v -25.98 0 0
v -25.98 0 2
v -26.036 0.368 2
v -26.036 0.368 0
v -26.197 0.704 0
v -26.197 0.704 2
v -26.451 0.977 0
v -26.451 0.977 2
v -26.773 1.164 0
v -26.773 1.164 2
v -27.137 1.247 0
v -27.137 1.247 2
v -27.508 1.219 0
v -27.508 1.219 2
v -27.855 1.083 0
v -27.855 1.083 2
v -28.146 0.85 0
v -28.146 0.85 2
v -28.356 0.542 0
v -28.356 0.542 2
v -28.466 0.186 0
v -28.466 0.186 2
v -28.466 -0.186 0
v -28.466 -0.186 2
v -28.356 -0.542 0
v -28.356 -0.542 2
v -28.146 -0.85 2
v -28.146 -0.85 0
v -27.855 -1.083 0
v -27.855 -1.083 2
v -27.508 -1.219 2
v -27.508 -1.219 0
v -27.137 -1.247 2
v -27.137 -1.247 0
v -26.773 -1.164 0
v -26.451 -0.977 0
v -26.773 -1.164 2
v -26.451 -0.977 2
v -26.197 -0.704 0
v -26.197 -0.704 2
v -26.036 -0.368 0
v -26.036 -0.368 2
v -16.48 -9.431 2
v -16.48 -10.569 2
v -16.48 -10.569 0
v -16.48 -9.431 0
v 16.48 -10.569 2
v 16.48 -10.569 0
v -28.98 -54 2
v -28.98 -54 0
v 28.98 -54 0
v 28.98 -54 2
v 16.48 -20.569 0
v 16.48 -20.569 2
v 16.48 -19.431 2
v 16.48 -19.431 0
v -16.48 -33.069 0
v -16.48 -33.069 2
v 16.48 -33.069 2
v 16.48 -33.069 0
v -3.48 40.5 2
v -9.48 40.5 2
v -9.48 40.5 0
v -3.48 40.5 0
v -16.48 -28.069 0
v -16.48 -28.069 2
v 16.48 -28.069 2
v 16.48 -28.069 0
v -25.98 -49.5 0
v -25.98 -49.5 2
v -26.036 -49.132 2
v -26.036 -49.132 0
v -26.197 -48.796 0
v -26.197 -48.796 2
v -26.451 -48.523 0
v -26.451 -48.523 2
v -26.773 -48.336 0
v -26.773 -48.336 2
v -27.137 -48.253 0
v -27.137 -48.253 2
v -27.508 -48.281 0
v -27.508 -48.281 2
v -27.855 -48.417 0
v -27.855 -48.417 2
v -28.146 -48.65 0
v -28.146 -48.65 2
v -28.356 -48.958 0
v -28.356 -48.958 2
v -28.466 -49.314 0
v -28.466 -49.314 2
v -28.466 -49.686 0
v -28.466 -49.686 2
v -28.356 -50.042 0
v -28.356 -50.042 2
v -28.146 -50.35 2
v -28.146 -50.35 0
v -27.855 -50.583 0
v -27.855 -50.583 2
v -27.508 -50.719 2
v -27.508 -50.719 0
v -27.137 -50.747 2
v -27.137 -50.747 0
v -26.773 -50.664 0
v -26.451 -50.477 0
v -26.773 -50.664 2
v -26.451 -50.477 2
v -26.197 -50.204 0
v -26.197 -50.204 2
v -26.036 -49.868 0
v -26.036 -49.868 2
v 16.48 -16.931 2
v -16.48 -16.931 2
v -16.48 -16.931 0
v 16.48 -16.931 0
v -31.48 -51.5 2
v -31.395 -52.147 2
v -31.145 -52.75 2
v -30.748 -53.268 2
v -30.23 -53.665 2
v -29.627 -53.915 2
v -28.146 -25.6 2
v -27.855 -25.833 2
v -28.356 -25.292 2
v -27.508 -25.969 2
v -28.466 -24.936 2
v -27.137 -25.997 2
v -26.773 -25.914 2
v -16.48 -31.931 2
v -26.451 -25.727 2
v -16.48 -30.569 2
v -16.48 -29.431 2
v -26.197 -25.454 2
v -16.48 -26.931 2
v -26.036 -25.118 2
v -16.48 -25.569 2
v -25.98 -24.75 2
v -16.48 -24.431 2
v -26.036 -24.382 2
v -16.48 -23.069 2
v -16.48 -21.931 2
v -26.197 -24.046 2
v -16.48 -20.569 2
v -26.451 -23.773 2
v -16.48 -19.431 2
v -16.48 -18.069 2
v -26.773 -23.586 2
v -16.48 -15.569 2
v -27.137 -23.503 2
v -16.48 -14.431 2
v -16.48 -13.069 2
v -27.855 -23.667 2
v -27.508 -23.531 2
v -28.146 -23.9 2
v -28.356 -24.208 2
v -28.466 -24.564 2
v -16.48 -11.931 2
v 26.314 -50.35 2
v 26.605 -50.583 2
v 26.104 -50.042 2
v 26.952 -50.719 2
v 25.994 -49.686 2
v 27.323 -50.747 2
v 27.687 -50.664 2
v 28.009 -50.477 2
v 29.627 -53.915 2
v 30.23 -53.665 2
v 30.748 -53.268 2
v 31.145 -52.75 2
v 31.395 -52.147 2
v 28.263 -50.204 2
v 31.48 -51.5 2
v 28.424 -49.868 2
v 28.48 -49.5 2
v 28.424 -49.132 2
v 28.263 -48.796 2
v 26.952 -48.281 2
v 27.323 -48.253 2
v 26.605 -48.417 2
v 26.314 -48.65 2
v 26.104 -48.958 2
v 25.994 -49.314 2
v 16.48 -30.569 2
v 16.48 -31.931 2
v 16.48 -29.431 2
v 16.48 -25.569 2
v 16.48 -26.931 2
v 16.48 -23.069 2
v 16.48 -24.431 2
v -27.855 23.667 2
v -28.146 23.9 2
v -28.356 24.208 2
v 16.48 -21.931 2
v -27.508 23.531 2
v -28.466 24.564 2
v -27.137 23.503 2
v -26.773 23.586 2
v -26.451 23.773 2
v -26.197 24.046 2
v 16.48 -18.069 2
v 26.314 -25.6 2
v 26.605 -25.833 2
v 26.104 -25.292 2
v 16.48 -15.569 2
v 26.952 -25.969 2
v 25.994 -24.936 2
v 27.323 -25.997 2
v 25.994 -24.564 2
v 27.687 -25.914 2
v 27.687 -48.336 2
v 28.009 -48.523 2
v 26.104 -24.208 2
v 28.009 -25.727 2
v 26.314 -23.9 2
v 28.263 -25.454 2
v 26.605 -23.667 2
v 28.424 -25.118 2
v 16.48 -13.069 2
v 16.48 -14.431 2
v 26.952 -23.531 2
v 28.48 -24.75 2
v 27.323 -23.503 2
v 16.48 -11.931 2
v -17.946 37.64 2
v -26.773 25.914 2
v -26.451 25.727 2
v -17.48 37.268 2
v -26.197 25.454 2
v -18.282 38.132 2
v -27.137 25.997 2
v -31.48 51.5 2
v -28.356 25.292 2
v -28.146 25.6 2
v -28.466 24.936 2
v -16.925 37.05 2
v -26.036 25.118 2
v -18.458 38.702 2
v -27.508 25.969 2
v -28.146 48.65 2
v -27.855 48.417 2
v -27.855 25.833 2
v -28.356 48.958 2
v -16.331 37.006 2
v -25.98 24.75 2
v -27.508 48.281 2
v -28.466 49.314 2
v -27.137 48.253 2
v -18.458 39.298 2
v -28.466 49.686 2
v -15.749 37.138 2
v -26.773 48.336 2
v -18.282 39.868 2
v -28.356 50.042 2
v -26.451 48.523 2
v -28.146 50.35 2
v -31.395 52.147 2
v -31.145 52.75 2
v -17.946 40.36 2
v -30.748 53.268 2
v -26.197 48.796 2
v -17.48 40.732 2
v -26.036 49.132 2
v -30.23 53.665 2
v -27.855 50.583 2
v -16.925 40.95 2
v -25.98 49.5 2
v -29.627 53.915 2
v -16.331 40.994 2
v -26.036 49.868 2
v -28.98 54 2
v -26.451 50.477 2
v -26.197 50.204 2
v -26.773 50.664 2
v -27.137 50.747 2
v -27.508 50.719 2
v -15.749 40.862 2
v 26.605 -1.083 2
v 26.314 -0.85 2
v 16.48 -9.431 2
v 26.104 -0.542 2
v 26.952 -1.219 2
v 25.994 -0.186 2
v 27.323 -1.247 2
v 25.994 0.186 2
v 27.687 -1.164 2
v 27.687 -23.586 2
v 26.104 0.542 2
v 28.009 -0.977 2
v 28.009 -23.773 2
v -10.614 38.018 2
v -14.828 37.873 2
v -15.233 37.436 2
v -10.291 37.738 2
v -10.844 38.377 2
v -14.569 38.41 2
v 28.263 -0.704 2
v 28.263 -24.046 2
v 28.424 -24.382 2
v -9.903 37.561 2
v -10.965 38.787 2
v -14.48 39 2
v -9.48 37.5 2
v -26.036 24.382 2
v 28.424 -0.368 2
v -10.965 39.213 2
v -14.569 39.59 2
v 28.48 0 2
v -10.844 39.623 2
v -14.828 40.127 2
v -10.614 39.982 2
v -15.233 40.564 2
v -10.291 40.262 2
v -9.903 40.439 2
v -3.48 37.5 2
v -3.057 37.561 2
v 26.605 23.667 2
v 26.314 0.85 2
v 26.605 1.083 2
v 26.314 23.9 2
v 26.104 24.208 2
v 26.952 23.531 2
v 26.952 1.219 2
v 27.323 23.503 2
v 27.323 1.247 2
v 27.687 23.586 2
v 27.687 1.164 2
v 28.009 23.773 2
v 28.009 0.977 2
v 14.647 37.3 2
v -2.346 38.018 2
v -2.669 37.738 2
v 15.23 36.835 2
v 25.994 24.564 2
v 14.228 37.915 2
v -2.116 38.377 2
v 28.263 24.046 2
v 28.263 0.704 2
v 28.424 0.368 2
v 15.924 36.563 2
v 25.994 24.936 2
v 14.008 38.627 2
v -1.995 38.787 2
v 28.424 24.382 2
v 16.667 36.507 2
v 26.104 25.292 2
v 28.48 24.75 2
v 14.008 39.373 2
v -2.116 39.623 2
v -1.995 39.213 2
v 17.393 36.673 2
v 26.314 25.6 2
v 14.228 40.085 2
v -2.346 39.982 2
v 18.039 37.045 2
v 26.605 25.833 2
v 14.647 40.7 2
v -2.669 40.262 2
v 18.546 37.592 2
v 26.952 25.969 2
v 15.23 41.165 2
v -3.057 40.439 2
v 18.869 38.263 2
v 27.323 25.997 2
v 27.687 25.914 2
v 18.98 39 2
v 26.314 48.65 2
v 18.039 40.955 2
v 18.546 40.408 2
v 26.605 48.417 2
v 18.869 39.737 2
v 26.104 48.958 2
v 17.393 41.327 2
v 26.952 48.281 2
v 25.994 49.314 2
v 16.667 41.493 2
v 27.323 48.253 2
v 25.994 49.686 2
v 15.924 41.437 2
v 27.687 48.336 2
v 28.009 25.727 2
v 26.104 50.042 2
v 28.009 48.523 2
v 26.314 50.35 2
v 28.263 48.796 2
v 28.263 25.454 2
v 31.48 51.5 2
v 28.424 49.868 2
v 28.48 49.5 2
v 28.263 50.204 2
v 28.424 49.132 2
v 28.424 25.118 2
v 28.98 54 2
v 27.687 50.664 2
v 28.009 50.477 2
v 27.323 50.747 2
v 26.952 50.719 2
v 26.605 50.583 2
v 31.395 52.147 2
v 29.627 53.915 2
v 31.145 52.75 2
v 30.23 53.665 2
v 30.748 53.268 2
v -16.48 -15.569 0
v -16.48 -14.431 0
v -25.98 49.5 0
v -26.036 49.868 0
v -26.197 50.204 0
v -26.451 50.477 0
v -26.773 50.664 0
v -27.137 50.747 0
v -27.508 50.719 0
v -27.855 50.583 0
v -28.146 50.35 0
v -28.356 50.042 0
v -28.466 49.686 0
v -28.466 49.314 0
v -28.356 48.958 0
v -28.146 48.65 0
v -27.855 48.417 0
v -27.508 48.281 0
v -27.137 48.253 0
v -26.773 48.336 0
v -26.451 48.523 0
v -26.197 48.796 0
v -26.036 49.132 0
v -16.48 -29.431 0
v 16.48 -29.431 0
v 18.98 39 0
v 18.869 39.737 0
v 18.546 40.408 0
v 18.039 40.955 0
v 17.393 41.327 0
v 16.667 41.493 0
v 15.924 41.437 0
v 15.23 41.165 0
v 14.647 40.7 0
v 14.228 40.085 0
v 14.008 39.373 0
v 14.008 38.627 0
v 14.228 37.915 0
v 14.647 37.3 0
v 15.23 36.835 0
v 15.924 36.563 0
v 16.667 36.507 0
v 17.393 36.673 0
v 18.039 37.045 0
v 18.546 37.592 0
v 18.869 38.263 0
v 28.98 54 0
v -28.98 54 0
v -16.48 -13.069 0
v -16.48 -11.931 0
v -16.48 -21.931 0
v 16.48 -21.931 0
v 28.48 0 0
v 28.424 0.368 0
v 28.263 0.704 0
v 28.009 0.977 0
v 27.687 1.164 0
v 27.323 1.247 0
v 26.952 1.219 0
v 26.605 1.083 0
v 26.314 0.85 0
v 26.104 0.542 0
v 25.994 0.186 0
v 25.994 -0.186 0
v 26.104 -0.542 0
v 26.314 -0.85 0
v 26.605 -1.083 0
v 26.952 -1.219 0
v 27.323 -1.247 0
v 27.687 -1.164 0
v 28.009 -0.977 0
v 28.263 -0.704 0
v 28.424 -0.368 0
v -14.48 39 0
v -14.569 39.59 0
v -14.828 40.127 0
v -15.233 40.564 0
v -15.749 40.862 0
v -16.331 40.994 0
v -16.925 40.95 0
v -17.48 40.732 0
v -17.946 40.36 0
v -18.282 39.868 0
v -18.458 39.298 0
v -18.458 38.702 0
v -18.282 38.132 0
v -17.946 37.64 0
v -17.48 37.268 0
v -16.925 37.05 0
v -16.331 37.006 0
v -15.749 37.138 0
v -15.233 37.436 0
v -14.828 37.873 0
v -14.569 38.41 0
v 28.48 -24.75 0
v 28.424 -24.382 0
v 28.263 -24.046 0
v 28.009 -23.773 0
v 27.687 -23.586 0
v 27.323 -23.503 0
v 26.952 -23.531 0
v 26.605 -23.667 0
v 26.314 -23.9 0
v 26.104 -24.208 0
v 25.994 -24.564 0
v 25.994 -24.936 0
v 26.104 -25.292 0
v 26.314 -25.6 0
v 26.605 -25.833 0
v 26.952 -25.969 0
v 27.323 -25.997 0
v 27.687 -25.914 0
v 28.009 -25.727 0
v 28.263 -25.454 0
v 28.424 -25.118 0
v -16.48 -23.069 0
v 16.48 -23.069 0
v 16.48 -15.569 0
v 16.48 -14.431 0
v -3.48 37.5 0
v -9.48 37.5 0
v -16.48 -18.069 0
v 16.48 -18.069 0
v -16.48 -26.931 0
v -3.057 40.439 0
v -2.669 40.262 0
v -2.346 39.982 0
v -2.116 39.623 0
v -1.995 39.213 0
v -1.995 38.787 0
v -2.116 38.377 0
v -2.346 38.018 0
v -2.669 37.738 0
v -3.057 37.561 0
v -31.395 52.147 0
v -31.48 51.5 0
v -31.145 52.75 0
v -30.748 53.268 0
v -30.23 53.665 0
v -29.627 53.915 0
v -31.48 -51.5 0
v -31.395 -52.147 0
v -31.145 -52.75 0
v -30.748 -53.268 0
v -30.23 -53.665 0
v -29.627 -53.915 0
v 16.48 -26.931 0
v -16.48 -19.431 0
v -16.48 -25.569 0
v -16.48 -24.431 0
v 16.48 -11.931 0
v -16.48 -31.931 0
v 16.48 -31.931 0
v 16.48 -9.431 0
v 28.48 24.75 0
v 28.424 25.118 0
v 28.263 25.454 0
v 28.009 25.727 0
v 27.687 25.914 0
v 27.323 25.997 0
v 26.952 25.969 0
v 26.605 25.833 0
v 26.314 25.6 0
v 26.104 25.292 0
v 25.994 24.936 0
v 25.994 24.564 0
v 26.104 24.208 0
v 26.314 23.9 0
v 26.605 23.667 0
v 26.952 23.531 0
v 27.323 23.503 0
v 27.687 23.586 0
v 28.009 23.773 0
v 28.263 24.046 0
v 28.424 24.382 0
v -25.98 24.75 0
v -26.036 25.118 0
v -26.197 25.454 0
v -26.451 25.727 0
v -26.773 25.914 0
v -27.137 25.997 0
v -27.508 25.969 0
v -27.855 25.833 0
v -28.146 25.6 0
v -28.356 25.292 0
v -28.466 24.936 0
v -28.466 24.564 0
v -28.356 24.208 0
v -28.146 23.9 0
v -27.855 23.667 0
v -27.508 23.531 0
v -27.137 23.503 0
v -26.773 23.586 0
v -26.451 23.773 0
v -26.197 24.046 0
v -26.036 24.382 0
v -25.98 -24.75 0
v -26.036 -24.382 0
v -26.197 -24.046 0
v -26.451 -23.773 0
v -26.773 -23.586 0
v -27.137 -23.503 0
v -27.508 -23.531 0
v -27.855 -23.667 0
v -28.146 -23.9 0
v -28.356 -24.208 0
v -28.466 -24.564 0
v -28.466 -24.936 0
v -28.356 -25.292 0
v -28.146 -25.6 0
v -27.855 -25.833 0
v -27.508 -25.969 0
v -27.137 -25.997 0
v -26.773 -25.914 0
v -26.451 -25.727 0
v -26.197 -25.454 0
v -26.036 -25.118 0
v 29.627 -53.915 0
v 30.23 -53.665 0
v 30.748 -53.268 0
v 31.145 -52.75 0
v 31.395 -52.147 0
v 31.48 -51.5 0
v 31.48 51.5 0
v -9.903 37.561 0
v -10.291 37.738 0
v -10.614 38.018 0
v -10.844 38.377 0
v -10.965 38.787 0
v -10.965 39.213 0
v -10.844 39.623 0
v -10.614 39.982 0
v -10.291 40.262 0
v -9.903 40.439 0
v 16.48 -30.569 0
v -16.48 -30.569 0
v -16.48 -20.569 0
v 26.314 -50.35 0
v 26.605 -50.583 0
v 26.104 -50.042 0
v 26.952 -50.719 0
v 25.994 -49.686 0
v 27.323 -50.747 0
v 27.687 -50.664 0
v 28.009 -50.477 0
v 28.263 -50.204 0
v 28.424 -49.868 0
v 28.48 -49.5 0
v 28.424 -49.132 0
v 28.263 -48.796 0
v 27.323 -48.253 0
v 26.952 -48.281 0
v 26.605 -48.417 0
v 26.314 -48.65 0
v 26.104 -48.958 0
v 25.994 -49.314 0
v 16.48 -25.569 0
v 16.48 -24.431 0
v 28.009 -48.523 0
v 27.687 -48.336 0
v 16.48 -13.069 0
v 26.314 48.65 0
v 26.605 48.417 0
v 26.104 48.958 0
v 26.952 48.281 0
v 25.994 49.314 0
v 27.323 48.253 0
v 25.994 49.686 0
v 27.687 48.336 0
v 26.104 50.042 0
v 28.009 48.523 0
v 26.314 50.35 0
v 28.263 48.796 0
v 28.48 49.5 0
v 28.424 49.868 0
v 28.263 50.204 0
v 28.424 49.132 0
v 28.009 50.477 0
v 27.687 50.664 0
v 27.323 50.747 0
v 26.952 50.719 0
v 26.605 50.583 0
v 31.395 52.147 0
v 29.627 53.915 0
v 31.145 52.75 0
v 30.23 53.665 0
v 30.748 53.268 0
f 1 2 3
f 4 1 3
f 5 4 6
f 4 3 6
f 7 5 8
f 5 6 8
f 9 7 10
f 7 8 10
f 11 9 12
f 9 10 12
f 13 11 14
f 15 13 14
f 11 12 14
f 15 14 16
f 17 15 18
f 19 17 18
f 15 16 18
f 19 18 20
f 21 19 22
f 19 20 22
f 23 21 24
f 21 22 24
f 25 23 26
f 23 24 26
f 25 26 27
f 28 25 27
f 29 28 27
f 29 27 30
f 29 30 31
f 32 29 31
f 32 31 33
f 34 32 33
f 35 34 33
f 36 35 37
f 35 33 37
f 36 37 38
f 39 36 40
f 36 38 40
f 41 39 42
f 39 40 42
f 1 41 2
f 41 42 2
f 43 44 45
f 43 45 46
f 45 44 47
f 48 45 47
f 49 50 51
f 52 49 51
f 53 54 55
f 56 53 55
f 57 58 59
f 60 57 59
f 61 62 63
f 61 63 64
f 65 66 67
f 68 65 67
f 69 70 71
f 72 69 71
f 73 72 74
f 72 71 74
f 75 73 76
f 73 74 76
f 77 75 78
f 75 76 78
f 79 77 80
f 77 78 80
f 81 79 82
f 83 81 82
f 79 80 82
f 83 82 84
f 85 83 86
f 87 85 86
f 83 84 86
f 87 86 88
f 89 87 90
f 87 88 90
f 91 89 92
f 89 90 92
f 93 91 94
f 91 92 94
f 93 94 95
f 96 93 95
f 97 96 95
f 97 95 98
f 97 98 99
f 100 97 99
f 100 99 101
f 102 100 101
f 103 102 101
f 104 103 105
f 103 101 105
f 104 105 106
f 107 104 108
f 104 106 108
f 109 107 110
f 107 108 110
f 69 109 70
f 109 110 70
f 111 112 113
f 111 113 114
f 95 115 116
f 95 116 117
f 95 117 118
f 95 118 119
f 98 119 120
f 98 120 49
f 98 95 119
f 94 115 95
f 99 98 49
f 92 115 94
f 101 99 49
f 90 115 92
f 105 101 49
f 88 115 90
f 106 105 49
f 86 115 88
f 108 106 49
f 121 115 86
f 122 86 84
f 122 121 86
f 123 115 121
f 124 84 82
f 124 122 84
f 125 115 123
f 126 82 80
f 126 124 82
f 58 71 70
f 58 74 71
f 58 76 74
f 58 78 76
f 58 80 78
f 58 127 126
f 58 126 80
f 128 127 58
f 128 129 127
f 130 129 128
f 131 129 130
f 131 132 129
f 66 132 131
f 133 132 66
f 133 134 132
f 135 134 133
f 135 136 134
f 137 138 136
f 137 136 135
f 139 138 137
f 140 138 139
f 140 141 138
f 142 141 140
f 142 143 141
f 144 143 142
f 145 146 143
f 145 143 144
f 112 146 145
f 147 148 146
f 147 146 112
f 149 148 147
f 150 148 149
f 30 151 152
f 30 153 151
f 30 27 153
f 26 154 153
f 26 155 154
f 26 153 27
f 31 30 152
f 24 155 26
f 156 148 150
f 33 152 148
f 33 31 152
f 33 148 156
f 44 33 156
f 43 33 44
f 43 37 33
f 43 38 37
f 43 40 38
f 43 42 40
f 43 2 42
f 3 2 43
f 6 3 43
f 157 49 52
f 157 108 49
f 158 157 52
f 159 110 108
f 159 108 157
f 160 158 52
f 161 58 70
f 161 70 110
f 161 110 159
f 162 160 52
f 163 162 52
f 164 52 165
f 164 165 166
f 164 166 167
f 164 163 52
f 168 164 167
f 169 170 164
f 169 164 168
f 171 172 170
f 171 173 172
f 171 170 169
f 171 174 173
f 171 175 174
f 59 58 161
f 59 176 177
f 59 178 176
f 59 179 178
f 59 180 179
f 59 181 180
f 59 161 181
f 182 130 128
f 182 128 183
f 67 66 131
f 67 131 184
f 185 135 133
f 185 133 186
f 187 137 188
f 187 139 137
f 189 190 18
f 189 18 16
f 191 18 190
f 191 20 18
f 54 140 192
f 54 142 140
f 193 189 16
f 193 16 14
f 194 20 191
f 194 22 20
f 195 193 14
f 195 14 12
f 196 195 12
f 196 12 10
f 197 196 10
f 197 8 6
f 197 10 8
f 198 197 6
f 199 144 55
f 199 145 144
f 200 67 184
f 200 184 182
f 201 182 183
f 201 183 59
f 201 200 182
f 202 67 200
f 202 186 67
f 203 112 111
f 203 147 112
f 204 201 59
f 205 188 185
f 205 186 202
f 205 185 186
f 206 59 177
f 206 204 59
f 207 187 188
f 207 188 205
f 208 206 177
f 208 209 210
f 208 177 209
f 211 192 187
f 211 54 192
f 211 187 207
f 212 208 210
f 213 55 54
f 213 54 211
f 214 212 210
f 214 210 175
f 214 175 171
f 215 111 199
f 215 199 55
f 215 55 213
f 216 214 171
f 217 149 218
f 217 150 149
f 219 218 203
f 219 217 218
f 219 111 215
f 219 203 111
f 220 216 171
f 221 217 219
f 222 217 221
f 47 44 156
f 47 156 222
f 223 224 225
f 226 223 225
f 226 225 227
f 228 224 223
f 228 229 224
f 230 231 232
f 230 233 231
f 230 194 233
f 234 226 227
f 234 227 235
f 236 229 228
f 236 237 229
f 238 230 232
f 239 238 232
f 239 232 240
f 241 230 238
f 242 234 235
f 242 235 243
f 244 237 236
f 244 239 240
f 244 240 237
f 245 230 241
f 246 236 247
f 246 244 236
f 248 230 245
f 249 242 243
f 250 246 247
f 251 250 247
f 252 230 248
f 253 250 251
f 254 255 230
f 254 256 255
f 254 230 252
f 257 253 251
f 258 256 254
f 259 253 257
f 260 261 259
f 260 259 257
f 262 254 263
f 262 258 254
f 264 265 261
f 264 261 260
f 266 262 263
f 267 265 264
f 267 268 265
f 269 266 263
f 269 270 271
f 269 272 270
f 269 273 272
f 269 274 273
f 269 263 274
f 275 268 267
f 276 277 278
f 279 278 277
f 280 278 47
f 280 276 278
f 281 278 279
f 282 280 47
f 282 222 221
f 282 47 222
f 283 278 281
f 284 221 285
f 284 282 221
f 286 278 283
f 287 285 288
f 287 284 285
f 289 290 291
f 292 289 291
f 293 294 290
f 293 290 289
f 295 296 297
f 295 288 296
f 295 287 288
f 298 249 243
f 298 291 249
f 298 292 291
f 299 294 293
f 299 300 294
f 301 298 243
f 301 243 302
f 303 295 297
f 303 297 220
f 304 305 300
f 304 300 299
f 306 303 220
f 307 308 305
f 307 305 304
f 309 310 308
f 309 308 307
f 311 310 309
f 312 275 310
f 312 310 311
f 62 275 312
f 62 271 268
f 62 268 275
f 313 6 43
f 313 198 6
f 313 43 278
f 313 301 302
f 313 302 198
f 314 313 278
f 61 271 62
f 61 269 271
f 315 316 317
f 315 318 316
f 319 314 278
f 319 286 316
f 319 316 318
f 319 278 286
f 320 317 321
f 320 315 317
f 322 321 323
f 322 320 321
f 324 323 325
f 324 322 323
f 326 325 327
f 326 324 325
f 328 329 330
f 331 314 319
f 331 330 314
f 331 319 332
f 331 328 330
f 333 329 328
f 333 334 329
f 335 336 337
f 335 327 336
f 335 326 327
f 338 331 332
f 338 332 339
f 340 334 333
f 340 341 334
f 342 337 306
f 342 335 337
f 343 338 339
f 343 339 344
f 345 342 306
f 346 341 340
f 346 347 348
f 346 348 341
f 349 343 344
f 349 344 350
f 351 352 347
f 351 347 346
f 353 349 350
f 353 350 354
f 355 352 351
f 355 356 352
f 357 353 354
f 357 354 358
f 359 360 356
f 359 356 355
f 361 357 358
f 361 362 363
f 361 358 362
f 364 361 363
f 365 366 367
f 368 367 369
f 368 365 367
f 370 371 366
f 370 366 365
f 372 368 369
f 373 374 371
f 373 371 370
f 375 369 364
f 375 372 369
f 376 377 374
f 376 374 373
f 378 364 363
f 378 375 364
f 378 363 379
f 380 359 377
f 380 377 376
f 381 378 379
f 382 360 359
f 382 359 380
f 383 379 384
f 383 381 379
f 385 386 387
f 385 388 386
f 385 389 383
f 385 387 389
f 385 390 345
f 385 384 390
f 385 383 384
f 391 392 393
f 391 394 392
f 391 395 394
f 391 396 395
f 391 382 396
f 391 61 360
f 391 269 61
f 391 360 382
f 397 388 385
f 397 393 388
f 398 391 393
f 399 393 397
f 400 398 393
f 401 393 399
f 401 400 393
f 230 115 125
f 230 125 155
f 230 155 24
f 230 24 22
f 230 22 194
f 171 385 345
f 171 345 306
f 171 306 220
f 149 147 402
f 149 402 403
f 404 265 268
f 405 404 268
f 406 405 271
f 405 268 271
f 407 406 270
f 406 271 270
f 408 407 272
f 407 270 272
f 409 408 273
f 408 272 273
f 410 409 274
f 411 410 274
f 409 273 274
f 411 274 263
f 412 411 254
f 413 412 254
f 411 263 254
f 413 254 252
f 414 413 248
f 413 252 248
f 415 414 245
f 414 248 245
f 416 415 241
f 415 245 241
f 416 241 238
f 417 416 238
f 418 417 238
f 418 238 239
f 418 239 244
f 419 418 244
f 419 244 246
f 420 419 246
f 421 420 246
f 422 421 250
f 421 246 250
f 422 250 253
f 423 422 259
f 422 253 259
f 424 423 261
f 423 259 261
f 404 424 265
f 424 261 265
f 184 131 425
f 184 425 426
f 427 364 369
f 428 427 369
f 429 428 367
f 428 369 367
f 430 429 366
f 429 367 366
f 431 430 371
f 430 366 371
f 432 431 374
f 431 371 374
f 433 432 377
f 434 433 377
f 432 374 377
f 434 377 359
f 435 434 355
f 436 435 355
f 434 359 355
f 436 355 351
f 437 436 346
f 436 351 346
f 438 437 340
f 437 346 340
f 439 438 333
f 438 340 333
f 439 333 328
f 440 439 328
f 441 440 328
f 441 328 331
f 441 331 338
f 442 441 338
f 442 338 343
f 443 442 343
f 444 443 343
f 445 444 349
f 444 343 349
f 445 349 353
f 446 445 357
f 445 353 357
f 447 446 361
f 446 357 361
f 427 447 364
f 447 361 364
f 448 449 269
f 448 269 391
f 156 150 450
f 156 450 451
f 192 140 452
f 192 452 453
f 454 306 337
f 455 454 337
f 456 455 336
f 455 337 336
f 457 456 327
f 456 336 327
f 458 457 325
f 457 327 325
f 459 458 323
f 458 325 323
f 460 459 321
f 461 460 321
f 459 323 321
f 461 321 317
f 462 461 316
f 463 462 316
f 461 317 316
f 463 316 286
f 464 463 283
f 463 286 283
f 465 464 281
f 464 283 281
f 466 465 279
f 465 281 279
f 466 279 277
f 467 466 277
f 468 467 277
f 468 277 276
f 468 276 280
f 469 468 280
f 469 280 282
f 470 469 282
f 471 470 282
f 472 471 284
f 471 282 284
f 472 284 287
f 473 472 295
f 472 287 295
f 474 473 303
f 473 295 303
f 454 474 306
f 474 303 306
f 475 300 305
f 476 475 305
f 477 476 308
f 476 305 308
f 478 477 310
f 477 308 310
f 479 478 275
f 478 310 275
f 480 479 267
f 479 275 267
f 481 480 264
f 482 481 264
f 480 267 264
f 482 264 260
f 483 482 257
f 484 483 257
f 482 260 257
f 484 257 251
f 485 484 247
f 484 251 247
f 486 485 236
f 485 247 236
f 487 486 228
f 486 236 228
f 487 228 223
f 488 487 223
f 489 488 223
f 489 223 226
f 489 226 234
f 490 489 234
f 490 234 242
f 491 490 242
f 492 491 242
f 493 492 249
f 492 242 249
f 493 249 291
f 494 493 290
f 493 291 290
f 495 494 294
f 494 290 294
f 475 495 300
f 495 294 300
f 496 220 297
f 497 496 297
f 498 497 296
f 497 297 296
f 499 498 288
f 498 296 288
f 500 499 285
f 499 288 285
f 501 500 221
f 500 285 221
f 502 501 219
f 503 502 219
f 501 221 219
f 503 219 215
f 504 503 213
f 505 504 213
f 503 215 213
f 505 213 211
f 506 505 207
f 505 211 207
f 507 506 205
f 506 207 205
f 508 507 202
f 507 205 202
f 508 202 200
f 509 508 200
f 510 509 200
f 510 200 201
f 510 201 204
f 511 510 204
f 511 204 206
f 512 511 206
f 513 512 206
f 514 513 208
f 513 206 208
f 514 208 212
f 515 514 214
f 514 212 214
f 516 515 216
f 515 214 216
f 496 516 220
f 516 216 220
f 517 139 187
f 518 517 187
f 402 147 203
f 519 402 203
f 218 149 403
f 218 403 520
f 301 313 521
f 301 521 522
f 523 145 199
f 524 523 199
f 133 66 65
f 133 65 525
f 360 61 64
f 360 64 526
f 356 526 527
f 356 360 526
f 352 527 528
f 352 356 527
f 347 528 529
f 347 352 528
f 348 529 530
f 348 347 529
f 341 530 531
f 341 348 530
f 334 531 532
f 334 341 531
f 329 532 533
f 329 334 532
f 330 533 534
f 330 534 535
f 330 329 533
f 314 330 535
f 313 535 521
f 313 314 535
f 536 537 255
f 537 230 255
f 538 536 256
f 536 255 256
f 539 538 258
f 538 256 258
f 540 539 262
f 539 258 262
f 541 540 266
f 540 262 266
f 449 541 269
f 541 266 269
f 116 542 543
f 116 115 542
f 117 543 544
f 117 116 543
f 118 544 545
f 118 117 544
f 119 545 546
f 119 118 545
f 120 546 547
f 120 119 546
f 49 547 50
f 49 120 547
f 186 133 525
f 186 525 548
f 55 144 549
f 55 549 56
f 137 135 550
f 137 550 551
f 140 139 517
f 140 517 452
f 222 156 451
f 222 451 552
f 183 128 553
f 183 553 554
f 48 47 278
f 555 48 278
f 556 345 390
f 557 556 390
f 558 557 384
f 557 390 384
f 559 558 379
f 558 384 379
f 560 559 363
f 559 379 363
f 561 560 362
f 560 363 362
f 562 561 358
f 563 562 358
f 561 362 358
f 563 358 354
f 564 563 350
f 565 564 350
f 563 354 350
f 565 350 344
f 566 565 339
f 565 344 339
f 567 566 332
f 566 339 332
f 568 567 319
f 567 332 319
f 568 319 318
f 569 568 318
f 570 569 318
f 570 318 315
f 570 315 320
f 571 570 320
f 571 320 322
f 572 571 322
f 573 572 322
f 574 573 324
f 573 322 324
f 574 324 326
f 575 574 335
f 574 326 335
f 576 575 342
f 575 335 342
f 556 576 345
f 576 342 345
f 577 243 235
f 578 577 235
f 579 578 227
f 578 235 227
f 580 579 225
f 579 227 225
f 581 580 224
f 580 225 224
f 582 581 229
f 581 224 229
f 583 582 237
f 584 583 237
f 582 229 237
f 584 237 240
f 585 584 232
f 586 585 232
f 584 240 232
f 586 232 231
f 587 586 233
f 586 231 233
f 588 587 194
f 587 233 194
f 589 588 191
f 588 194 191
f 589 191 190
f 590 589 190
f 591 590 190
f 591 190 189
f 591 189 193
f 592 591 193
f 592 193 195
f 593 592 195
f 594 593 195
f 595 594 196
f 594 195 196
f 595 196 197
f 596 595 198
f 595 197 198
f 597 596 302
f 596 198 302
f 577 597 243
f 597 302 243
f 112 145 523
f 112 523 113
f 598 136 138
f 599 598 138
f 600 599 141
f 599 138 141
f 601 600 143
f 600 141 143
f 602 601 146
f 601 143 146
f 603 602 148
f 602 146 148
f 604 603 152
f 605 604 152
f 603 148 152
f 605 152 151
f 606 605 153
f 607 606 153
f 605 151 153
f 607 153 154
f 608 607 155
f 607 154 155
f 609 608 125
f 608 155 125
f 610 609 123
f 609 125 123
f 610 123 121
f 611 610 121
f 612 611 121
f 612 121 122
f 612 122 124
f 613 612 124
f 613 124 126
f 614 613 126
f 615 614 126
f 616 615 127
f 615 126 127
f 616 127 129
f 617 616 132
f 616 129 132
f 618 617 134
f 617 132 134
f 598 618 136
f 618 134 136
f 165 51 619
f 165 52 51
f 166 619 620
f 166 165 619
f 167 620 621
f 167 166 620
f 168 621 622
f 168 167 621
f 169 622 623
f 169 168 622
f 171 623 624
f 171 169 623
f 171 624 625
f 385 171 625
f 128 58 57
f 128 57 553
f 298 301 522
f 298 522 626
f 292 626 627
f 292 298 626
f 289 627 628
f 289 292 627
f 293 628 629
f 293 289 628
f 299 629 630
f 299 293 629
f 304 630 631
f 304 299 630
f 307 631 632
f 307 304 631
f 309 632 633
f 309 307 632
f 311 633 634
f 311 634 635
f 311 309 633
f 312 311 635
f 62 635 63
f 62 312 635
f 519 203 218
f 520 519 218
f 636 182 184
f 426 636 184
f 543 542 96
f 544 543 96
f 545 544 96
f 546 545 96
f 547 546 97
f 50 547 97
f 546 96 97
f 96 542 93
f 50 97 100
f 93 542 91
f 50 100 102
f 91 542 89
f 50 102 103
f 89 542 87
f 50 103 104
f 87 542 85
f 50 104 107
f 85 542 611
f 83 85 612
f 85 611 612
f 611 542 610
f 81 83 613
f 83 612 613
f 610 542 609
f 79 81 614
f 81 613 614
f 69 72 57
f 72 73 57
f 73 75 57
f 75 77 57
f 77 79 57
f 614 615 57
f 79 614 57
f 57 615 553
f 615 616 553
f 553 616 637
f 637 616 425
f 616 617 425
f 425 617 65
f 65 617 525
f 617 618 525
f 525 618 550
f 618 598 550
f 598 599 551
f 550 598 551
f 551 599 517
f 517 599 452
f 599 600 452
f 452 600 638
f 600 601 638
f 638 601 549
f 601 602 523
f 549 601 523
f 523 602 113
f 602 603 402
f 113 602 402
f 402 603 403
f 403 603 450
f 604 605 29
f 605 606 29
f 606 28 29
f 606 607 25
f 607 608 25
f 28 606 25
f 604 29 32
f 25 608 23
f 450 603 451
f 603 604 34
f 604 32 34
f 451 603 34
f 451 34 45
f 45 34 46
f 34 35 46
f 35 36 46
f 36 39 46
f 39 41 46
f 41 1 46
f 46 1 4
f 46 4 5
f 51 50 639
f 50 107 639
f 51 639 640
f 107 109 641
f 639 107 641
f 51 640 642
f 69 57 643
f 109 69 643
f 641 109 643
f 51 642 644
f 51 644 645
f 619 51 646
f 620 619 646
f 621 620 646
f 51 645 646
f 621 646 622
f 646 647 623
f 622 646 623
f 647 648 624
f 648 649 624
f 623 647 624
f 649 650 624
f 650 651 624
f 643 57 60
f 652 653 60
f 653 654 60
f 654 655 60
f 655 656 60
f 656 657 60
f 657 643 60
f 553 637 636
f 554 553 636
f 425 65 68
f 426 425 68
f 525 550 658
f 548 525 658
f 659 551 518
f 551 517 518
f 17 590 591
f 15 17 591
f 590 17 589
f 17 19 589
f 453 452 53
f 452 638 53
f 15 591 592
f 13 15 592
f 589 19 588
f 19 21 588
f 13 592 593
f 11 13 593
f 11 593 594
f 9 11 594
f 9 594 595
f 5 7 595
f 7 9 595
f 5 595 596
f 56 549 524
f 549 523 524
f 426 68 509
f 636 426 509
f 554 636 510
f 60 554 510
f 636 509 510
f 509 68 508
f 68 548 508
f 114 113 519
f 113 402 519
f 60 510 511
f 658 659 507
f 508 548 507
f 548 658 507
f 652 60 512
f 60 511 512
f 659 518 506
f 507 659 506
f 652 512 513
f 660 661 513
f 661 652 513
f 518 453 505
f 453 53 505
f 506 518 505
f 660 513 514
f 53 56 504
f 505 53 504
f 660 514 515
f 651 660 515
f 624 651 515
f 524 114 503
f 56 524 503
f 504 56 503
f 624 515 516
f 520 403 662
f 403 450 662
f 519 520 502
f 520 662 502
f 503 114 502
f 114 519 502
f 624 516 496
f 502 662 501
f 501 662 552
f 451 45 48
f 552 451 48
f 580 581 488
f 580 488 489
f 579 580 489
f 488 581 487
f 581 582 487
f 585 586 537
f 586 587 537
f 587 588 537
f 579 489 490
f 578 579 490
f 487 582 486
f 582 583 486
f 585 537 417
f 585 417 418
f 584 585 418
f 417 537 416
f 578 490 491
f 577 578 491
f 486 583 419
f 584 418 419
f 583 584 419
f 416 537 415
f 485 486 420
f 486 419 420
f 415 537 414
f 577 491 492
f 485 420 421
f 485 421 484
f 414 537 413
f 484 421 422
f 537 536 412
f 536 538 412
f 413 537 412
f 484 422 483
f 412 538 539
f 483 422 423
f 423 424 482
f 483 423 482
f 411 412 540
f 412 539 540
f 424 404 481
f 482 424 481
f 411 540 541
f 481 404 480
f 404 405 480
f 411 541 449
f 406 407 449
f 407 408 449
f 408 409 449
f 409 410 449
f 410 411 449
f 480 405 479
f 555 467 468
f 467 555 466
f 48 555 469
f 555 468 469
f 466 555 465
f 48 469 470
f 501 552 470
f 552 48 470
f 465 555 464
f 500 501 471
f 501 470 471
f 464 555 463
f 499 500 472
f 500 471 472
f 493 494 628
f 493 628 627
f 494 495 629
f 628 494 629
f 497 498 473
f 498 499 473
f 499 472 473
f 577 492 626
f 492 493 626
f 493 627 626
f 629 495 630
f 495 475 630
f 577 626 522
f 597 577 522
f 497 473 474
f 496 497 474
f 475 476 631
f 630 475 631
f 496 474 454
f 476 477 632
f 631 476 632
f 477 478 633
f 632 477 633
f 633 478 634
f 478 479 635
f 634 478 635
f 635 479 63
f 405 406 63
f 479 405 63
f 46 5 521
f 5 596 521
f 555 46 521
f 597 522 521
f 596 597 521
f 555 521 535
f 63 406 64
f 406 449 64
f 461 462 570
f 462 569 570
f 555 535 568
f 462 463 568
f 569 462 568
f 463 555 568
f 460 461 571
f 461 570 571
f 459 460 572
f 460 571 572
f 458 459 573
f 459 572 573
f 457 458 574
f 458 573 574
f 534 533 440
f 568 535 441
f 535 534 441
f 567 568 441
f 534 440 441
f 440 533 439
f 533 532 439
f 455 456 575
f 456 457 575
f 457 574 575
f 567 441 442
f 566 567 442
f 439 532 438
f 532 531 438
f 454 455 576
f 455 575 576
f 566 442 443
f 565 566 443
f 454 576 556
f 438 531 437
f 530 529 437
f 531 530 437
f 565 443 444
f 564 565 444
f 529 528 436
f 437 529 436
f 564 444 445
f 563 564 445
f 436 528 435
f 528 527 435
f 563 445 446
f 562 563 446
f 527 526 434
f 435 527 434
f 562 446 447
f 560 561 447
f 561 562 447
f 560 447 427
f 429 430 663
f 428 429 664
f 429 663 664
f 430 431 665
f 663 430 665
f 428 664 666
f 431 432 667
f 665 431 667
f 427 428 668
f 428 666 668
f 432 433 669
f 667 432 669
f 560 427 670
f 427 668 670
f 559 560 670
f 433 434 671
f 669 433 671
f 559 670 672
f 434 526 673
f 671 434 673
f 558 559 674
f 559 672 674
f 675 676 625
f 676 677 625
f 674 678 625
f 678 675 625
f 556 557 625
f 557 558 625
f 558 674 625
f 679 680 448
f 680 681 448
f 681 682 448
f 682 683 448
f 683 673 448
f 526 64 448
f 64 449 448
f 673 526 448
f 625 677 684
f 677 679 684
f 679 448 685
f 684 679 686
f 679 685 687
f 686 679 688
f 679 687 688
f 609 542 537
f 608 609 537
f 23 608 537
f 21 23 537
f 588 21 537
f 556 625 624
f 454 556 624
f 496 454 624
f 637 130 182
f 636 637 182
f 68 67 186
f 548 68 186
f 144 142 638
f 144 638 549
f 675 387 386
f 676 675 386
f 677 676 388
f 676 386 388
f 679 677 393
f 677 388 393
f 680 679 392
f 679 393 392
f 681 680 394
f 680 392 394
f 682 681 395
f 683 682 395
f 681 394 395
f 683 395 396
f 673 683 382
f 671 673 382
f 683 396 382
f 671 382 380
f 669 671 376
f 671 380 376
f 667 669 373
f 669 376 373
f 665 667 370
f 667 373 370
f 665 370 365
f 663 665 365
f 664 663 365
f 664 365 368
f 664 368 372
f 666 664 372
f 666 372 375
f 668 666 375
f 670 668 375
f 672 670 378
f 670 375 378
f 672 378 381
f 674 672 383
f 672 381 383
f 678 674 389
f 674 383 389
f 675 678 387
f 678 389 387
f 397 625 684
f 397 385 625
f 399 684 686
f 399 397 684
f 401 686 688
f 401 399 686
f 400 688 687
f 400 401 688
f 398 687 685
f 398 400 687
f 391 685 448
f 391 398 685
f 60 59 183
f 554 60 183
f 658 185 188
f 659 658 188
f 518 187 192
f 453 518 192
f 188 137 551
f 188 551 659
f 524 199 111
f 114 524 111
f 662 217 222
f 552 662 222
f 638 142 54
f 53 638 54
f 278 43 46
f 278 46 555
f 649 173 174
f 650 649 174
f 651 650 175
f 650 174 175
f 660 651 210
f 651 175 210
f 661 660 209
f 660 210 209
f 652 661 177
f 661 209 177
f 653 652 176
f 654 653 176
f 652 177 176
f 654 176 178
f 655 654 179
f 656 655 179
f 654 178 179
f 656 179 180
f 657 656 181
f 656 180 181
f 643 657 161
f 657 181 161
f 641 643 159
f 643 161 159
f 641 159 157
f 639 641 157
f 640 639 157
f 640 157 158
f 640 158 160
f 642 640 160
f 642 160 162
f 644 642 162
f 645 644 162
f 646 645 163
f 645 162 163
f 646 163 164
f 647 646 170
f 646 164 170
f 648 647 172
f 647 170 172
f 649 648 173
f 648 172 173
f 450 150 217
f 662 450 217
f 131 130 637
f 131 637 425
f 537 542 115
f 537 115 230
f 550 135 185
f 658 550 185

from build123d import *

# Parameters (mm, degrees)
SKETCH1_W           = 62.96
SKETCH1_H           = 108
BOSS_EXTRUDE1_DEPTH = 2
FILLET1_R           = 2.5
SKETCH2_R           = 1.25
CUT_EXTRUDE1_DEPTH  = 2
SKETCH3_R           = 2.5
SKETCH3_R_2         = 2
SKETCH3_W           = 32.96
SKETCH3_H           = 1.138869598
CUT_EXTRUDE2_DEPTH  = 2


with BuildPart() as part:
    # Sketch1 → Boss-Extrude1 (new body)
    with BuildSketch(Plane.XY):
        Rectangle(SKETCH1_W, SKETCH1_H)
    extrude(amount=BOSS_EXTRUDE1_DEPTH)

    # Fillet1
    fillet1_edges = [part.edges().sort_by_distance(p)[0] for p in [
        (31.48, -54, 1),
        (-31.48, -54, 1),
        (-31.48, 54, 1),
        (31.48, 54, 1),
    ]]
    fillet(fillet1_edges, radius=FILLET1_R)

    # Sketch2 → Cut-Extrude1 (cut)
    with BuildSketch(Plane.XY.offset(2)):
        with Locations((-27.23, 49.5)):
            Circle(SKETCH2_R)
        with Locations((27.23, 49.5)):
            Circle(SKETCH2_R)
        with Locations((27.23, 24.75)):
            Circle(SKETCH2_R)
        with Locations((27.23, 0)):
            Circle(SKETCH2_R)
        with Locations((27.23, -24.75)):
            Circle(SKETCH2_R)
        with Locations((27.23, -49.5)):
            Circle(SKETCH2_R)
        with Locations((-27.23, 24.75)):
            Circle(SKETCH2_R)
        with Locations((-27.23, 0)):
            Circle(SKETCH2_R)
        with Locations((-27.23, -24.75)):
            Circle(SKETCH2_R)
        with Locations((-27.23, -49.5)):
            Circle(SKETCH2_R)
    extrude(amount=-CUT_EXTRUDE1_DEPTH, mode=Mode.SUBTRACT)

    # Sketch3 → Cut-Extrude2 (cut)
    with BuildSketch(Plane.XY.offset(2)):
        with Locations((16.48, 39)):
            Circle(SKETCH3_R)
        with Locations((-16.48, 39)):
            Circle(SKETCH3_R_2)
        with BuildLine():
            Line((-9.48, 40.5), (-3.48, 40.5))
            ThreePointArc((-3.48, 40.5), (-1.98, 39), (-3.48, 37.5))
            Line((-3.48, 37.5), (-9.48, 37.5))
            ThreePointArc((-9.48, 37.5), (-10.98, 39), (-9.48, 40.5))
        make_face()
        with Locations((0, -12.5)):
            Rectangle(SKETCH3_W, SKETCH3_H)
        with Locations((0, -10)):
            Rectangle(SKETCH3_W, SKETCH3_H)
        with Locations((0, -15)):
            Rectangle(SKETCH3_W, SKETCH3_H)
        with Locations((0, -17.5)):
            Rectangle(SKETCH3_W, SKETCH3_H)
        with Locations((0, -20)):
            Rectangle(SKETCH3_W, SKETCH3_H)
        with Locations((0, -22.5)):
            Rectangle(SKETCH3_W, SKETCH3_H)
        with Locations((0, -25)):
            Rectangle(SKETCH3_W, SKETCH3_H)
        with Locations((0, -27.5)):
            Rectangle(SKETCH3_W, SKETCH3_H)
        with Locations((0, -30)):
            Rectangle(SKETCH3_W, SKETCH3_H)
        with Locations((0, -32.5)):
            Rectangle(SKETCH3_W, SKETCH3_H)
    extrude(amount=-CUT_EXTRUDE2_DEPTH, mode=Mode.SUBTRACT)


solid = part.part
